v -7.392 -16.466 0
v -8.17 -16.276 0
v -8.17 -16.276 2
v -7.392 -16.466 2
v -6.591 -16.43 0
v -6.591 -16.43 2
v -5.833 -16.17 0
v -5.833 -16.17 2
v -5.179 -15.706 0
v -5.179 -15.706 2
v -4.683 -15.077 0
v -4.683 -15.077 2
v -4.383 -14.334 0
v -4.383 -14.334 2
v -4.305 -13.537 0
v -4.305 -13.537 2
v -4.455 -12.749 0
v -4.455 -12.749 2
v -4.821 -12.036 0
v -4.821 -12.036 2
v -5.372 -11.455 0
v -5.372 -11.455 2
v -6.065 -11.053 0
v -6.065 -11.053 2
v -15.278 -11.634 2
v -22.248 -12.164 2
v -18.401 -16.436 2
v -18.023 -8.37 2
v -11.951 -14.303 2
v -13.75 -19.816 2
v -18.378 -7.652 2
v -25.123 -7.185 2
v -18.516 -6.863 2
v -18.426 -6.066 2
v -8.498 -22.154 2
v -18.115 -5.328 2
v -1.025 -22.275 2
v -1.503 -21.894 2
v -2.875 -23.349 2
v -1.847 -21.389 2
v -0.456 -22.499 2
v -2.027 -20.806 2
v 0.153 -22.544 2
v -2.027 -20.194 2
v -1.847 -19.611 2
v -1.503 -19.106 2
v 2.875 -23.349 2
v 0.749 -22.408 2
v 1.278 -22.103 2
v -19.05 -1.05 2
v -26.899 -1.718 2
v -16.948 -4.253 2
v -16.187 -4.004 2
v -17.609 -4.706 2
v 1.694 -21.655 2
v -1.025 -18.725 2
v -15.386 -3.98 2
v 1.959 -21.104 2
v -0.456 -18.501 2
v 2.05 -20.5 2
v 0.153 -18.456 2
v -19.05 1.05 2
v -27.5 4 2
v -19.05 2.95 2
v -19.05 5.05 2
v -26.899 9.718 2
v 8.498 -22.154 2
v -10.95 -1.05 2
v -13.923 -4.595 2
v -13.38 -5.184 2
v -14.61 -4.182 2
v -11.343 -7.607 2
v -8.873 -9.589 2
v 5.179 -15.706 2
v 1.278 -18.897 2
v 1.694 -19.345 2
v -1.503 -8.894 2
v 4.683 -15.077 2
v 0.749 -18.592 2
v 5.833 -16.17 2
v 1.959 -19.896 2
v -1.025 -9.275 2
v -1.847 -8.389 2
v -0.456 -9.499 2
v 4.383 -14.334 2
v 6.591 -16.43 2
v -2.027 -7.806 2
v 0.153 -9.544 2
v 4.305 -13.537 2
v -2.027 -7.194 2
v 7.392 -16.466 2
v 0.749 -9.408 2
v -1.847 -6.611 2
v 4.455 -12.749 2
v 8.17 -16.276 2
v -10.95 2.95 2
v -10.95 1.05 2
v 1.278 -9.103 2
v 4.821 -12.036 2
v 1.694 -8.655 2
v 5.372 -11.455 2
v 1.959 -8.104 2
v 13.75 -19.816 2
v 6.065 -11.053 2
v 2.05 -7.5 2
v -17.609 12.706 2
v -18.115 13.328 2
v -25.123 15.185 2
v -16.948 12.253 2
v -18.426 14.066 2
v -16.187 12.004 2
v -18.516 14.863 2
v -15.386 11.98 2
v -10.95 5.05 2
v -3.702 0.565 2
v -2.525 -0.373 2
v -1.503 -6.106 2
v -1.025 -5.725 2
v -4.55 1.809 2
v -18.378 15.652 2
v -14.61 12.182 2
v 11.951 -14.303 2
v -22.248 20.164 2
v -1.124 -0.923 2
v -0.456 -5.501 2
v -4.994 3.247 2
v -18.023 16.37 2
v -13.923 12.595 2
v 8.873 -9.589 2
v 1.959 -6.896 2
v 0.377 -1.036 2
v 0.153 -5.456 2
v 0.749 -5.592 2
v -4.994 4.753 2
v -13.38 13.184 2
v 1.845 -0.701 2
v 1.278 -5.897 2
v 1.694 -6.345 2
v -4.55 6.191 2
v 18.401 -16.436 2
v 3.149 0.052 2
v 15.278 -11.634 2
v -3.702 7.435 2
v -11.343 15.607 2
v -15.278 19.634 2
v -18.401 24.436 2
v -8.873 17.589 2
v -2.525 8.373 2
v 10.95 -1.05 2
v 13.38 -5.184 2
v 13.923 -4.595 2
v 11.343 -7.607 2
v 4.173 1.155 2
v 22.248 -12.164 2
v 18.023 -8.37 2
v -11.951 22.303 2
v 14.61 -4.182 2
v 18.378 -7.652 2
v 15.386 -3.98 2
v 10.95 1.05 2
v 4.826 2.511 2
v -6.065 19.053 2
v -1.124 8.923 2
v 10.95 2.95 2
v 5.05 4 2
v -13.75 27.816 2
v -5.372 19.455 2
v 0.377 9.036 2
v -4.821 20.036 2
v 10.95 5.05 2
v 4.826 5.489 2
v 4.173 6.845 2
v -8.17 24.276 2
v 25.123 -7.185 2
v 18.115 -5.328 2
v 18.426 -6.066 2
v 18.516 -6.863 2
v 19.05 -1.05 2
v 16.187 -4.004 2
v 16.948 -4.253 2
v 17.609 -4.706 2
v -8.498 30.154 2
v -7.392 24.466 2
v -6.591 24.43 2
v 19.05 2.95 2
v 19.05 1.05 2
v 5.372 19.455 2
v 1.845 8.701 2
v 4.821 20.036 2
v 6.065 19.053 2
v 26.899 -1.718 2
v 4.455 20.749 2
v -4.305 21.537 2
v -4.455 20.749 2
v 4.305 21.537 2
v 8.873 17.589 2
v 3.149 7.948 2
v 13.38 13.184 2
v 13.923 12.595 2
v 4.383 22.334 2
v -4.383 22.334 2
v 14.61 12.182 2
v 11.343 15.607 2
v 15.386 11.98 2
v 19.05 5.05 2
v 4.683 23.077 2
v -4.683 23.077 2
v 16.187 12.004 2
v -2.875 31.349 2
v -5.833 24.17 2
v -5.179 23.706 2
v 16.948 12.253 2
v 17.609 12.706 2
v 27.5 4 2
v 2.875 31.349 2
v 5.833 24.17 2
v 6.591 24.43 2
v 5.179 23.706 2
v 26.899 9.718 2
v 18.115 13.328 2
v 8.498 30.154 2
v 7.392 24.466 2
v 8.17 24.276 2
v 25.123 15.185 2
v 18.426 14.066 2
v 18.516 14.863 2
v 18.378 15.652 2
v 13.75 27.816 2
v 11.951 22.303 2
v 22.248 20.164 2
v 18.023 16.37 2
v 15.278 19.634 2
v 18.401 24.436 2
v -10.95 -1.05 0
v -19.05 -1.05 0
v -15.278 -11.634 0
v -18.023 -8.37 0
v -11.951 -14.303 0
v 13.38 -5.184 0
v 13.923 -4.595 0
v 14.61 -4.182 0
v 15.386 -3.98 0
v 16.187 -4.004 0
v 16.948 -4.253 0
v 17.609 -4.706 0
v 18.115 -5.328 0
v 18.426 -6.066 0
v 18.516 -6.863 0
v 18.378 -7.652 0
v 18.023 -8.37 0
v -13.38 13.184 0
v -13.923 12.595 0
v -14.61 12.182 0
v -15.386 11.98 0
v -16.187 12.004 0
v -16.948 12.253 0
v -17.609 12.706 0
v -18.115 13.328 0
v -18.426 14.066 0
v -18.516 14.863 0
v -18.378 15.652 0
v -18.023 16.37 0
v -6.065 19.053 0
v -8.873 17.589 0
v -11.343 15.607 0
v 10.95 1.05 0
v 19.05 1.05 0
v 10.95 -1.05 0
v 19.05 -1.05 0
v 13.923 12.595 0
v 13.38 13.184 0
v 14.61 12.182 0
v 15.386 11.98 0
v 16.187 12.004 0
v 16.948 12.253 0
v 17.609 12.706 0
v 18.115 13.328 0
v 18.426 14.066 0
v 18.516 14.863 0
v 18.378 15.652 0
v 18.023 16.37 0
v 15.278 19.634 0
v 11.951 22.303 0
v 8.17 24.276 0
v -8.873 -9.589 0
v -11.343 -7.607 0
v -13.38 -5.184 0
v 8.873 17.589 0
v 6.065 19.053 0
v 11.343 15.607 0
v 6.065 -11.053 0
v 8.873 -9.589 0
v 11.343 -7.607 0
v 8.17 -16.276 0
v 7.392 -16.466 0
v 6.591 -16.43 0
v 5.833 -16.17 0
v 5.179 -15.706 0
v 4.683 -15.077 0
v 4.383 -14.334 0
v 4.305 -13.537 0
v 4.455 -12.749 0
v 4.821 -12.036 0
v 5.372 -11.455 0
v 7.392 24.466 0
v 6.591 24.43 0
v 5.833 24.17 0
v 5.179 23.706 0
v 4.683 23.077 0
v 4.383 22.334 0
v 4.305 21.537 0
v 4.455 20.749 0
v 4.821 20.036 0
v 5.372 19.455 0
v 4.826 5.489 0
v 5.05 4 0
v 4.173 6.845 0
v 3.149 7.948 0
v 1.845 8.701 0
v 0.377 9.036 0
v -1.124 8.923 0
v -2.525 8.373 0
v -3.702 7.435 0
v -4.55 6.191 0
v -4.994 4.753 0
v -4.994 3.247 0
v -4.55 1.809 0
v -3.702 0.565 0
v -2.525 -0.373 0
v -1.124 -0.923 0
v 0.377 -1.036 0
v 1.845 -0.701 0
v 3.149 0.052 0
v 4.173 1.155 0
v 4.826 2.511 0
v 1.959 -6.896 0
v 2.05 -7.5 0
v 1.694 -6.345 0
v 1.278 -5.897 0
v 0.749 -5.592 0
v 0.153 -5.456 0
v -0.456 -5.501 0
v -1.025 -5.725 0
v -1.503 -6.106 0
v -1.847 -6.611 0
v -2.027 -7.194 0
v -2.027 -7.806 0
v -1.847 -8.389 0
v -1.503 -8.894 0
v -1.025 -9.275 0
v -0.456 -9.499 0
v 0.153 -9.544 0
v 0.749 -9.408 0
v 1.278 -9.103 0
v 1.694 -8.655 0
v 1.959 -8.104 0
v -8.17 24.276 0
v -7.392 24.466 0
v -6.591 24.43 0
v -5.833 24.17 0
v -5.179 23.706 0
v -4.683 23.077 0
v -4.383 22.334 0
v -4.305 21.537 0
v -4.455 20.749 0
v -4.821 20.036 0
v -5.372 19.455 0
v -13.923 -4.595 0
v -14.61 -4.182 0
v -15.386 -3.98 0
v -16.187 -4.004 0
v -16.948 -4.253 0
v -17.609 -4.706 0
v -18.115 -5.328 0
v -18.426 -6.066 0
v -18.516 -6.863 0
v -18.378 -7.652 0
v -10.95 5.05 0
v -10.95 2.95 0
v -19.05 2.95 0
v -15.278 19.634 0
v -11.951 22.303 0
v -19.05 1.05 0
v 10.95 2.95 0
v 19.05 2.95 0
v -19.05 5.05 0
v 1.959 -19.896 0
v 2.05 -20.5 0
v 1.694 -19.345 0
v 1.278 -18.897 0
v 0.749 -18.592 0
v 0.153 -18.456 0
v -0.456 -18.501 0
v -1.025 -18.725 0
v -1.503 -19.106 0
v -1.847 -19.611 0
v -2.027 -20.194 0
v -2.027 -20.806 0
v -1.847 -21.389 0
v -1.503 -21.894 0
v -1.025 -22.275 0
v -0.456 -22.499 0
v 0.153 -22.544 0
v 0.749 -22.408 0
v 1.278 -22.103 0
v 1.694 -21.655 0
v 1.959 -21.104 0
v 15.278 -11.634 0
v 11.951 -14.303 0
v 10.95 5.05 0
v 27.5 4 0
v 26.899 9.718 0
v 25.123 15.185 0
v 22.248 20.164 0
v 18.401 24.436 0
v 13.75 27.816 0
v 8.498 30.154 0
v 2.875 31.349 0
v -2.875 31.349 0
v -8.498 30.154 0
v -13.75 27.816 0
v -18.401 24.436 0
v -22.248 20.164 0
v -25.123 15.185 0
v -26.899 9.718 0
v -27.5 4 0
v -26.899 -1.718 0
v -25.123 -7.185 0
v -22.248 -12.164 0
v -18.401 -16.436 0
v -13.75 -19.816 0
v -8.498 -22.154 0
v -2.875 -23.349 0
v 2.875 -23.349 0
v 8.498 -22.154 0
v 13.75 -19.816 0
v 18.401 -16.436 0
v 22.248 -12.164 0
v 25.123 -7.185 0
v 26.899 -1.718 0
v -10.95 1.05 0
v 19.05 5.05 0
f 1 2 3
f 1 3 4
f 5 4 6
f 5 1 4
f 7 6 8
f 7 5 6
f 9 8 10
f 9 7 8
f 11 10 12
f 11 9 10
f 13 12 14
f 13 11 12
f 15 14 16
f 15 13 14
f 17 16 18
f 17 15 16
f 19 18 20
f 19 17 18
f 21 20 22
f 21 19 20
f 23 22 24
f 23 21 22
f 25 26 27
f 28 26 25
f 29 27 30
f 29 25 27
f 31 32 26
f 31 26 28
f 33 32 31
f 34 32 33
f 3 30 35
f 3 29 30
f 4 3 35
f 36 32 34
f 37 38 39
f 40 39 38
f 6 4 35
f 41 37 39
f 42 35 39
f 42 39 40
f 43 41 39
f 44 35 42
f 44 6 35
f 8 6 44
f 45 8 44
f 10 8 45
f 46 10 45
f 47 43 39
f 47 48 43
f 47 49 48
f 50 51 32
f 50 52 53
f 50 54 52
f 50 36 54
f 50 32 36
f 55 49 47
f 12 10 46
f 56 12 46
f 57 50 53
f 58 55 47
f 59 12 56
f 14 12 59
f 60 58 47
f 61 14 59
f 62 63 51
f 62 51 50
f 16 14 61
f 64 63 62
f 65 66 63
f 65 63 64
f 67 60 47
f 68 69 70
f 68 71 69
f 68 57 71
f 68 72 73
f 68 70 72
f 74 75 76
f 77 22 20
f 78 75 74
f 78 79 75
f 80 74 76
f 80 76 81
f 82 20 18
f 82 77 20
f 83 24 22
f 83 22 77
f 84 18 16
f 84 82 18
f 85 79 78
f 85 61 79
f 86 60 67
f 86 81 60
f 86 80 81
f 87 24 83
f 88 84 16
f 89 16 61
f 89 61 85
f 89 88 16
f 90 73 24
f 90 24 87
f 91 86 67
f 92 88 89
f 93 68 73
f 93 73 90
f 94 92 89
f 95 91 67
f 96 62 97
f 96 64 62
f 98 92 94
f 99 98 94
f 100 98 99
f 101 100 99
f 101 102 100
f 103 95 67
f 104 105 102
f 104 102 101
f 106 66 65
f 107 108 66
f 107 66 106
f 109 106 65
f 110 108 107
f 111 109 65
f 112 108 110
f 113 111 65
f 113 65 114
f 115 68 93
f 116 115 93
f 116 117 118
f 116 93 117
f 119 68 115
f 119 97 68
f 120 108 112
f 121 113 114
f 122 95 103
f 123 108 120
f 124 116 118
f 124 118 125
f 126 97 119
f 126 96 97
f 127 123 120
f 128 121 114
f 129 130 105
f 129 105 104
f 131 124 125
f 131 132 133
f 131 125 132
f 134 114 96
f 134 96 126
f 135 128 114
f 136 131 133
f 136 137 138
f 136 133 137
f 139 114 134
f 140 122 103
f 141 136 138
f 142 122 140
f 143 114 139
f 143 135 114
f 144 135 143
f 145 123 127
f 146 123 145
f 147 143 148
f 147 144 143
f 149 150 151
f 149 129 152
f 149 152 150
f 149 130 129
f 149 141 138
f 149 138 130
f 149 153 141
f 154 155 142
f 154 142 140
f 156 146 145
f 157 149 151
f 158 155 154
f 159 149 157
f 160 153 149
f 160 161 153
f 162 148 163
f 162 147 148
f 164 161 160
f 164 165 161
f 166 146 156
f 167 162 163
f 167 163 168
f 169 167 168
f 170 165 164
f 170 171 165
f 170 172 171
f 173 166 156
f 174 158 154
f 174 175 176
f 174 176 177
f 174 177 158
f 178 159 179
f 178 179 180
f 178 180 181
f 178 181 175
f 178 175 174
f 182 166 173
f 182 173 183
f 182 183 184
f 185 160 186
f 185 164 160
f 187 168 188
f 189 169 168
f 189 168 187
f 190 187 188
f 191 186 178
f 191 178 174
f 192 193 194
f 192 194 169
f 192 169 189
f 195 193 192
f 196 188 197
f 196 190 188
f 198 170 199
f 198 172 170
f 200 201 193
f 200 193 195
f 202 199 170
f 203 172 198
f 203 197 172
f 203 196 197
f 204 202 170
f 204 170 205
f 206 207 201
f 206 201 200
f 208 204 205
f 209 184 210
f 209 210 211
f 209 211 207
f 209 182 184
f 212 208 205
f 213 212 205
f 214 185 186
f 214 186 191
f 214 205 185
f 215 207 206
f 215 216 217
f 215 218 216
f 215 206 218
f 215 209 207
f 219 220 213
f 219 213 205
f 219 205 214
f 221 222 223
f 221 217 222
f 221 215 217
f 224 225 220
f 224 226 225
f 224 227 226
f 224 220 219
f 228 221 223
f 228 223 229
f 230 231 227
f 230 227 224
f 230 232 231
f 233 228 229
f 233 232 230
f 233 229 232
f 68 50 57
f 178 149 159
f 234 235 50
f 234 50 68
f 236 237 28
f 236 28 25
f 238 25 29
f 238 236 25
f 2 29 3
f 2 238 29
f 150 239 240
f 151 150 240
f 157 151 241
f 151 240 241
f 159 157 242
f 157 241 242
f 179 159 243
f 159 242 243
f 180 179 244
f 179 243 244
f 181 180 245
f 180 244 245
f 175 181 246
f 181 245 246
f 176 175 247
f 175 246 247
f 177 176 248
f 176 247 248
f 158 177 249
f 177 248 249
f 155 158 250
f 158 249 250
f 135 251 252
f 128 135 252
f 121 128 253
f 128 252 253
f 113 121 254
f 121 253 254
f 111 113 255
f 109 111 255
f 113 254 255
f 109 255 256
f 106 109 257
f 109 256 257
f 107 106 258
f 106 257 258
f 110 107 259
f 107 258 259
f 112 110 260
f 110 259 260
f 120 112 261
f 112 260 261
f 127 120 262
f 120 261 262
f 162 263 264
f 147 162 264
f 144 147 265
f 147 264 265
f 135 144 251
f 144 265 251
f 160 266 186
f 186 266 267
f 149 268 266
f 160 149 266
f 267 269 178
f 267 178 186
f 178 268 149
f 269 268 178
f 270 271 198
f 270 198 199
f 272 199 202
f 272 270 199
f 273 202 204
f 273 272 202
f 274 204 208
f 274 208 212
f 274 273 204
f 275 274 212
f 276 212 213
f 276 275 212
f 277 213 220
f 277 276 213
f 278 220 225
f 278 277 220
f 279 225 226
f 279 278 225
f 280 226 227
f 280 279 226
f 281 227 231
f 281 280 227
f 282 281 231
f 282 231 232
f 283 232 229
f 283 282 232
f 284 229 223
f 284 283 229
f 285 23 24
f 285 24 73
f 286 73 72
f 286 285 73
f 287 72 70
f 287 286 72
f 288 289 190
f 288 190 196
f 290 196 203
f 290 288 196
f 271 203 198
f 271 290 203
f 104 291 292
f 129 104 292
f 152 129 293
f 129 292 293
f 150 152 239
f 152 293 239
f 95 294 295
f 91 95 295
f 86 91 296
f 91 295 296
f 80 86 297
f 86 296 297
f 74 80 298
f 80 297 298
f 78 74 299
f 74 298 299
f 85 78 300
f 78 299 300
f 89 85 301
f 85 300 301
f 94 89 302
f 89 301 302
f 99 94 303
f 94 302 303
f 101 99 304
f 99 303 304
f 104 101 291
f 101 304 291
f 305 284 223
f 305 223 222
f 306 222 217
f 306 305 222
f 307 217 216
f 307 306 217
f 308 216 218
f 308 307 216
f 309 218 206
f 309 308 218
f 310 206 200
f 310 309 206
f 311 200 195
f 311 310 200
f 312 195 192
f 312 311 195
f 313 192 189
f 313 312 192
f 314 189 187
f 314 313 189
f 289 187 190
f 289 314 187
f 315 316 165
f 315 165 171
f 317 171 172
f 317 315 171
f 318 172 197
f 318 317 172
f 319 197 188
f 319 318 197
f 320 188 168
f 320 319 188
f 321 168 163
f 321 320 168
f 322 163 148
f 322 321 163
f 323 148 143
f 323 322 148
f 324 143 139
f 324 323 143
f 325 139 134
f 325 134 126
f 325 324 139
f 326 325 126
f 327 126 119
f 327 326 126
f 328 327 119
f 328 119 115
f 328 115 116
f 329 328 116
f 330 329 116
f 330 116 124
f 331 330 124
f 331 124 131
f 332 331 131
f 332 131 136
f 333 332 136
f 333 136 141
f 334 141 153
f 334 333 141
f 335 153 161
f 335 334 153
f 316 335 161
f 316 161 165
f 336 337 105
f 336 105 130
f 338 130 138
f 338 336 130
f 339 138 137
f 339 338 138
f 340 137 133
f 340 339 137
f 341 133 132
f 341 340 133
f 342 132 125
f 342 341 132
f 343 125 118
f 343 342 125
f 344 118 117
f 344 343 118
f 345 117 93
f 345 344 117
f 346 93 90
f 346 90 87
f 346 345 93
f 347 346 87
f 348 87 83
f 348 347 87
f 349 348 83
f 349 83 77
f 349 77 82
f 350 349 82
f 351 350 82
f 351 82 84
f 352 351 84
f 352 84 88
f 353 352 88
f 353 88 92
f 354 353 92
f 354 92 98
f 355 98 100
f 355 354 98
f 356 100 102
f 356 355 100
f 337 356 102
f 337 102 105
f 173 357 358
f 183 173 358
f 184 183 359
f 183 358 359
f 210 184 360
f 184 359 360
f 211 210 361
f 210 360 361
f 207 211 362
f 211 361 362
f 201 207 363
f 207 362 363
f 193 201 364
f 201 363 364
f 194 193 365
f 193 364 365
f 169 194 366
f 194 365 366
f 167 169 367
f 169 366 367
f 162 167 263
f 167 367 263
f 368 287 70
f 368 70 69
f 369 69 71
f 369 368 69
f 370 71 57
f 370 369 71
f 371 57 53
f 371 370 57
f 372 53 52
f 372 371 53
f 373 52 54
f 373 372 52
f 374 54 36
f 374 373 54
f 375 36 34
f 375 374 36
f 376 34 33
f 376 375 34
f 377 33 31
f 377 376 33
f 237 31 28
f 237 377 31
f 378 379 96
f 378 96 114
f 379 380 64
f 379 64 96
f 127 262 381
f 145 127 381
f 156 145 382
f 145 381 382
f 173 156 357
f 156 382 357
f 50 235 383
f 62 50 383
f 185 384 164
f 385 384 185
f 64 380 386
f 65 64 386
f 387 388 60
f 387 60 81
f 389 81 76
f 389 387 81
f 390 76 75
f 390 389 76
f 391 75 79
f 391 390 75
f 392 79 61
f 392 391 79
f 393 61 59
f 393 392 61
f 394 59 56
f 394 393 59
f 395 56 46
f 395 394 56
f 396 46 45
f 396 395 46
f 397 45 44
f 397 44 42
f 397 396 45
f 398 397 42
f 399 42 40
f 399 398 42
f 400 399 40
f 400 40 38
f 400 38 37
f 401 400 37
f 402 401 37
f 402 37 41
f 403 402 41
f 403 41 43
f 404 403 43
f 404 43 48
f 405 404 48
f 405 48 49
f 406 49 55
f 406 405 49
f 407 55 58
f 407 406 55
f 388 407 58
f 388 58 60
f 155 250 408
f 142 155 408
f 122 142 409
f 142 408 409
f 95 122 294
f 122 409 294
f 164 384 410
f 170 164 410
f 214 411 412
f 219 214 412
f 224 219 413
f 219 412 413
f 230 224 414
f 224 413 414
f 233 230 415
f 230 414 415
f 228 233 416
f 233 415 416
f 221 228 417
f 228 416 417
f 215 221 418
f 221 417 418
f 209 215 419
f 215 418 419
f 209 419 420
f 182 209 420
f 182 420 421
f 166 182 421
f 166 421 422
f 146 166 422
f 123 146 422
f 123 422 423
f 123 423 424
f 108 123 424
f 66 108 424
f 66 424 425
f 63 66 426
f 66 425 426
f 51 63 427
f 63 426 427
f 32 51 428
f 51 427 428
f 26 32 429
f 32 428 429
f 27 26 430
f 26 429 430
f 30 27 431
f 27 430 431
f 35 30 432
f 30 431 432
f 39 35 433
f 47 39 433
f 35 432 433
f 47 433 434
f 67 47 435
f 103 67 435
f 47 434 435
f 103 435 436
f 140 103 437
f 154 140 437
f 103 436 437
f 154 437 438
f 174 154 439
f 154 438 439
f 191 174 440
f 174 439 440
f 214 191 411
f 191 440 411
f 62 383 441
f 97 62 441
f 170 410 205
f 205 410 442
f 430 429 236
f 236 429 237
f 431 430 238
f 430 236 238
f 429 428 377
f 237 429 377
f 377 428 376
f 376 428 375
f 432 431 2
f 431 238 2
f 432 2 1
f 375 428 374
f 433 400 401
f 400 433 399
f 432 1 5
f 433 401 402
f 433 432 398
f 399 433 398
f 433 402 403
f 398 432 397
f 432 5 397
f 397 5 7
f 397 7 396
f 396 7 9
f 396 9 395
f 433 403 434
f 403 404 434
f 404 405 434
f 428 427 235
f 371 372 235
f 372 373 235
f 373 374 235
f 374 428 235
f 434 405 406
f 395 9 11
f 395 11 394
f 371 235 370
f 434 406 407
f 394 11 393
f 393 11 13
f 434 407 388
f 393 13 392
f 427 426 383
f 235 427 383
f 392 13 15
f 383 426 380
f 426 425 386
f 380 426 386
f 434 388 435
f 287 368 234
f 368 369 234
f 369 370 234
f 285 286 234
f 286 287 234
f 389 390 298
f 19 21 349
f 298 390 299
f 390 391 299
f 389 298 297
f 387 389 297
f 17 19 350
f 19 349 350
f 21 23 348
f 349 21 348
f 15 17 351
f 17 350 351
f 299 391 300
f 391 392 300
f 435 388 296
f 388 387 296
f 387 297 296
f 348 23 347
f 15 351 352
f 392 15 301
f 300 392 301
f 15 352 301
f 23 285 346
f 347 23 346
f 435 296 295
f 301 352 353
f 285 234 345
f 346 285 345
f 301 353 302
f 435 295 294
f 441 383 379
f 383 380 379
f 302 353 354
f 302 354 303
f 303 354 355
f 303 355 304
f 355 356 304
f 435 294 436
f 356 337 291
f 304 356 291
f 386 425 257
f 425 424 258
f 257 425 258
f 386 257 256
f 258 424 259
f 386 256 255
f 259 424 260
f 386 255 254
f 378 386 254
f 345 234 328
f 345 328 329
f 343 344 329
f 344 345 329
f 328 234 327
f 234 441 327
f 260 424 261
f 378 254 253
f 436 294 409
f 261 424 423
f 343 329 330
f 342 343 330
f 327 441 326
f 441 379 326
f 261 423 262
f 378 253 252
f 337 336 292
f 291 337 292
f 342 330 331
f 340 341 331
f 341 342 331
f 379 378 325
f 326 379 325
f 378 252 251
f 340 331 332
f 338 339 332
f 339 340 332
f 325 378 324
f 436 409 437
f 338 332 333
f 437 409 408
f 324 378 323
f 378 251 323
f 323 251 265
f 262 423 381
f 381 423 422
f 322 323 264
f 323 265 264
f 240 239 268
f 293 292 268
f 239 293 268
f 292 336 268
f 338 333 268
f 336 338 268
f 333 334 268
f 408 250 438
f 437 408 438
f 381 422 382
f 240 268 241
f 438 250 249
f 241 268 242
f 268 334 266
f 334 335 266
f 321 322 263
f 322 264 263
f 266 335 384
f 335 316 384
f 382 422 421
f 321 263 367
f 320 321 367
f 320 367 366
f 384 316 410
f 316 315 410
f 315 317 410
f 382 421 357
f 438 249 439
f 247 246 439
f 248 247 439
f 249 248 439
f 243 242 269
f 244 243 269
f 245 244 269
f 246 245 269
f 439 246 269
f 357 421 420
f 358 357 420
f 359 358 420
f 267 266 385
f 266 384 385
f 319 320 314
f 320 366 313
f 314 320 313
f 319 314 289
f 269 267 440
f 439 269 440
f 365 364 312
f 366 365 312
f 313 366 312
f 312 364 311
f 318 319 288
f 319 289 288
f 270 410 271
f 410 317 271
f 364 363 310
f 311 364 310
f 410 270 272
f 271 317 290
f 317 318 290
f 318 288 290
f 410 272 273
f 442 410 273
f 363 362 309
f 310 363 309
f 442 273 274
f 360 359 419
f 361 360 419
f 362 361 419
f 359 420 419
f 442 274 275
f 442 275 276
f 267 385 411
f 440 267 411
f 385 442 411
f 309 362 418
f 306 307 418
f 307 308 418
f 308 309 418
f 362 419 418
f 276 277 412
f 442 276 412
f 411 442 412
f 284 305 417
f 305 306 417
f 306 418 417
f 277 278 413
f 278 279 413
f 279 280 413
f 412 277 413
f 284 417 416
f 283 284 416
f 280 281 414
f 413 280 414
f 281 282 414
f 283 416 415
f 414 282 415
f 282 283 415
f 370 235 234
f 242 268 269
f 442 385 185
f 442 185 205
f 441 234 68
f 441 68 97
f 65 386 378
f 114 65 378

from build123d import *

# Parameters (mm, degrees)
SKETCH_1_R      = 27.5
SKETCH_1_R_2    = 5.05
SKETCH_1_R_3    = 2.05
SKETCH_1_W      = 8.1
SKETCH_1_H      = 2.1
EXTRUDE_1_DEPTH = 2


with BuildPart() as part:
    # 草图1 → 凸台-拉伸1 (new body)
    with BuildSketch(Plane.XY):
        with Locations((0, 4)):
            Circle(SKETCH_1_R)
        with Locations((0, 4)):
            Circle(SKETCH_1_R_2, mode=Mode.SUBTRACT)
        with Locations((0, -7.5)):
            Circle(SKETCH_1_R_3, mode=Mode.SUBTRACT)
        with Locations((0, -20.5)):
            Circle(SKETCH_1_R_3, mode=Mode.SUBTRACT)
        with Locations((-15, 4)):
            Rectangle(SKETCH_1_W, SKETCH_1_H, mode=Mode.SUBTRACT)
        with Locations((-15, 0)):
            Rectangle(SKETCH_1_W, SKETCH_1_H, mode=Mode.SUBTRACT)
        with Locations((15, 4)):
            Rectangle(SKETCH_1_W, SKETCH_1_H, mode=Mode.SUBTRACT)
        with Locations((15, 0)):
            Rectangle(SKETCH_1_W, SKETCH_1_H, mode=Mode.SUBTRACT)
        with BuildLine():
            ThreePointArc((-18.02272766, -8.370387974), (-13.679746228, -13.050212729), (-8.169823727, -16.275581156))
            ThreePointArc((-8.169823727, -16.275581156), (-4.506388665, -14.716501354), (-6.065468468, -11.053066292))
            ThreePointArc((-6.065468468, -11.053066292), (-10.156163971, -8.658477236), (-13.380495097, -5.184065739))
            ThreePointArc((-13.380495097, -5.184065739), (-17.294772496, -4.456110575), (-18.02272766, -8.370387974))
        make_face(mode=Mode.SUBTRACT)
        with BuildLine():
            ThreePointArc((18.02272766, -8.370387974), (13.679746228, -13.050212729), (8.169823727, -16.275581156))
            ThreePointArc((8.169823727, -16.275581156), (4.506388665, -14.716501354), (6.065468468, -11.053066292))
            ThreePointArc((6.065468468, -11.053066292), (10.156163971, -8.658477236), (13.380495097, -5.184065739))
            ThreePointArc((13.380495097, -5.184065739), (17.294772496, -4.456110575), (18.02272766, -8.370387974))
        make_face(mode=Mode.SUBTRACT)
        with BuildLine():
            ThreePointArc((18.02272766, 16.370387974), (13.679746228, 21.050212729), (8.169823727, 24.275581156))
            ThreePointArc((8.169823727, 24.275581156), (4.506388665, 22.716501354), (6.065468468, 19.053066292))
            ThreePointArc((6.065468468, 19.053066292), (10.156163971, 16.658477236), (13.380495097, 13.184065739))
            ThreePointArc((13.380495097, 13.184065739), (17.294772496, 12.456110575), (18.02272766, 16.370387974))
        make_face(mode=Mode.SUBTRACT)
        with BuildLine():
            ThreePointArc((-18.02272766, 16.370387974), (-13.679746228, 21.050212729), (-8.169823727, 24.275581156))
            ThreePointArc((-8.169823727, 24.275581156), (-4.506388665, 22.716501354), (-6.065468468, 19.053066292))
            ThreePointArc((-6.065468468, 19.053066292), (-10.156163971, 16.658477236), (-13.380495097, 13.184065739))
            ThreePointArc((-13.380495097, 13.184065739), (-17.294772496, 12.456110575), (-18.02272766, 16.370387974))
        make_face(mode=Mode.SUBTRACT)
    extrude(amount=EXTRUDE_1_DEPTH)


solid = part.part
